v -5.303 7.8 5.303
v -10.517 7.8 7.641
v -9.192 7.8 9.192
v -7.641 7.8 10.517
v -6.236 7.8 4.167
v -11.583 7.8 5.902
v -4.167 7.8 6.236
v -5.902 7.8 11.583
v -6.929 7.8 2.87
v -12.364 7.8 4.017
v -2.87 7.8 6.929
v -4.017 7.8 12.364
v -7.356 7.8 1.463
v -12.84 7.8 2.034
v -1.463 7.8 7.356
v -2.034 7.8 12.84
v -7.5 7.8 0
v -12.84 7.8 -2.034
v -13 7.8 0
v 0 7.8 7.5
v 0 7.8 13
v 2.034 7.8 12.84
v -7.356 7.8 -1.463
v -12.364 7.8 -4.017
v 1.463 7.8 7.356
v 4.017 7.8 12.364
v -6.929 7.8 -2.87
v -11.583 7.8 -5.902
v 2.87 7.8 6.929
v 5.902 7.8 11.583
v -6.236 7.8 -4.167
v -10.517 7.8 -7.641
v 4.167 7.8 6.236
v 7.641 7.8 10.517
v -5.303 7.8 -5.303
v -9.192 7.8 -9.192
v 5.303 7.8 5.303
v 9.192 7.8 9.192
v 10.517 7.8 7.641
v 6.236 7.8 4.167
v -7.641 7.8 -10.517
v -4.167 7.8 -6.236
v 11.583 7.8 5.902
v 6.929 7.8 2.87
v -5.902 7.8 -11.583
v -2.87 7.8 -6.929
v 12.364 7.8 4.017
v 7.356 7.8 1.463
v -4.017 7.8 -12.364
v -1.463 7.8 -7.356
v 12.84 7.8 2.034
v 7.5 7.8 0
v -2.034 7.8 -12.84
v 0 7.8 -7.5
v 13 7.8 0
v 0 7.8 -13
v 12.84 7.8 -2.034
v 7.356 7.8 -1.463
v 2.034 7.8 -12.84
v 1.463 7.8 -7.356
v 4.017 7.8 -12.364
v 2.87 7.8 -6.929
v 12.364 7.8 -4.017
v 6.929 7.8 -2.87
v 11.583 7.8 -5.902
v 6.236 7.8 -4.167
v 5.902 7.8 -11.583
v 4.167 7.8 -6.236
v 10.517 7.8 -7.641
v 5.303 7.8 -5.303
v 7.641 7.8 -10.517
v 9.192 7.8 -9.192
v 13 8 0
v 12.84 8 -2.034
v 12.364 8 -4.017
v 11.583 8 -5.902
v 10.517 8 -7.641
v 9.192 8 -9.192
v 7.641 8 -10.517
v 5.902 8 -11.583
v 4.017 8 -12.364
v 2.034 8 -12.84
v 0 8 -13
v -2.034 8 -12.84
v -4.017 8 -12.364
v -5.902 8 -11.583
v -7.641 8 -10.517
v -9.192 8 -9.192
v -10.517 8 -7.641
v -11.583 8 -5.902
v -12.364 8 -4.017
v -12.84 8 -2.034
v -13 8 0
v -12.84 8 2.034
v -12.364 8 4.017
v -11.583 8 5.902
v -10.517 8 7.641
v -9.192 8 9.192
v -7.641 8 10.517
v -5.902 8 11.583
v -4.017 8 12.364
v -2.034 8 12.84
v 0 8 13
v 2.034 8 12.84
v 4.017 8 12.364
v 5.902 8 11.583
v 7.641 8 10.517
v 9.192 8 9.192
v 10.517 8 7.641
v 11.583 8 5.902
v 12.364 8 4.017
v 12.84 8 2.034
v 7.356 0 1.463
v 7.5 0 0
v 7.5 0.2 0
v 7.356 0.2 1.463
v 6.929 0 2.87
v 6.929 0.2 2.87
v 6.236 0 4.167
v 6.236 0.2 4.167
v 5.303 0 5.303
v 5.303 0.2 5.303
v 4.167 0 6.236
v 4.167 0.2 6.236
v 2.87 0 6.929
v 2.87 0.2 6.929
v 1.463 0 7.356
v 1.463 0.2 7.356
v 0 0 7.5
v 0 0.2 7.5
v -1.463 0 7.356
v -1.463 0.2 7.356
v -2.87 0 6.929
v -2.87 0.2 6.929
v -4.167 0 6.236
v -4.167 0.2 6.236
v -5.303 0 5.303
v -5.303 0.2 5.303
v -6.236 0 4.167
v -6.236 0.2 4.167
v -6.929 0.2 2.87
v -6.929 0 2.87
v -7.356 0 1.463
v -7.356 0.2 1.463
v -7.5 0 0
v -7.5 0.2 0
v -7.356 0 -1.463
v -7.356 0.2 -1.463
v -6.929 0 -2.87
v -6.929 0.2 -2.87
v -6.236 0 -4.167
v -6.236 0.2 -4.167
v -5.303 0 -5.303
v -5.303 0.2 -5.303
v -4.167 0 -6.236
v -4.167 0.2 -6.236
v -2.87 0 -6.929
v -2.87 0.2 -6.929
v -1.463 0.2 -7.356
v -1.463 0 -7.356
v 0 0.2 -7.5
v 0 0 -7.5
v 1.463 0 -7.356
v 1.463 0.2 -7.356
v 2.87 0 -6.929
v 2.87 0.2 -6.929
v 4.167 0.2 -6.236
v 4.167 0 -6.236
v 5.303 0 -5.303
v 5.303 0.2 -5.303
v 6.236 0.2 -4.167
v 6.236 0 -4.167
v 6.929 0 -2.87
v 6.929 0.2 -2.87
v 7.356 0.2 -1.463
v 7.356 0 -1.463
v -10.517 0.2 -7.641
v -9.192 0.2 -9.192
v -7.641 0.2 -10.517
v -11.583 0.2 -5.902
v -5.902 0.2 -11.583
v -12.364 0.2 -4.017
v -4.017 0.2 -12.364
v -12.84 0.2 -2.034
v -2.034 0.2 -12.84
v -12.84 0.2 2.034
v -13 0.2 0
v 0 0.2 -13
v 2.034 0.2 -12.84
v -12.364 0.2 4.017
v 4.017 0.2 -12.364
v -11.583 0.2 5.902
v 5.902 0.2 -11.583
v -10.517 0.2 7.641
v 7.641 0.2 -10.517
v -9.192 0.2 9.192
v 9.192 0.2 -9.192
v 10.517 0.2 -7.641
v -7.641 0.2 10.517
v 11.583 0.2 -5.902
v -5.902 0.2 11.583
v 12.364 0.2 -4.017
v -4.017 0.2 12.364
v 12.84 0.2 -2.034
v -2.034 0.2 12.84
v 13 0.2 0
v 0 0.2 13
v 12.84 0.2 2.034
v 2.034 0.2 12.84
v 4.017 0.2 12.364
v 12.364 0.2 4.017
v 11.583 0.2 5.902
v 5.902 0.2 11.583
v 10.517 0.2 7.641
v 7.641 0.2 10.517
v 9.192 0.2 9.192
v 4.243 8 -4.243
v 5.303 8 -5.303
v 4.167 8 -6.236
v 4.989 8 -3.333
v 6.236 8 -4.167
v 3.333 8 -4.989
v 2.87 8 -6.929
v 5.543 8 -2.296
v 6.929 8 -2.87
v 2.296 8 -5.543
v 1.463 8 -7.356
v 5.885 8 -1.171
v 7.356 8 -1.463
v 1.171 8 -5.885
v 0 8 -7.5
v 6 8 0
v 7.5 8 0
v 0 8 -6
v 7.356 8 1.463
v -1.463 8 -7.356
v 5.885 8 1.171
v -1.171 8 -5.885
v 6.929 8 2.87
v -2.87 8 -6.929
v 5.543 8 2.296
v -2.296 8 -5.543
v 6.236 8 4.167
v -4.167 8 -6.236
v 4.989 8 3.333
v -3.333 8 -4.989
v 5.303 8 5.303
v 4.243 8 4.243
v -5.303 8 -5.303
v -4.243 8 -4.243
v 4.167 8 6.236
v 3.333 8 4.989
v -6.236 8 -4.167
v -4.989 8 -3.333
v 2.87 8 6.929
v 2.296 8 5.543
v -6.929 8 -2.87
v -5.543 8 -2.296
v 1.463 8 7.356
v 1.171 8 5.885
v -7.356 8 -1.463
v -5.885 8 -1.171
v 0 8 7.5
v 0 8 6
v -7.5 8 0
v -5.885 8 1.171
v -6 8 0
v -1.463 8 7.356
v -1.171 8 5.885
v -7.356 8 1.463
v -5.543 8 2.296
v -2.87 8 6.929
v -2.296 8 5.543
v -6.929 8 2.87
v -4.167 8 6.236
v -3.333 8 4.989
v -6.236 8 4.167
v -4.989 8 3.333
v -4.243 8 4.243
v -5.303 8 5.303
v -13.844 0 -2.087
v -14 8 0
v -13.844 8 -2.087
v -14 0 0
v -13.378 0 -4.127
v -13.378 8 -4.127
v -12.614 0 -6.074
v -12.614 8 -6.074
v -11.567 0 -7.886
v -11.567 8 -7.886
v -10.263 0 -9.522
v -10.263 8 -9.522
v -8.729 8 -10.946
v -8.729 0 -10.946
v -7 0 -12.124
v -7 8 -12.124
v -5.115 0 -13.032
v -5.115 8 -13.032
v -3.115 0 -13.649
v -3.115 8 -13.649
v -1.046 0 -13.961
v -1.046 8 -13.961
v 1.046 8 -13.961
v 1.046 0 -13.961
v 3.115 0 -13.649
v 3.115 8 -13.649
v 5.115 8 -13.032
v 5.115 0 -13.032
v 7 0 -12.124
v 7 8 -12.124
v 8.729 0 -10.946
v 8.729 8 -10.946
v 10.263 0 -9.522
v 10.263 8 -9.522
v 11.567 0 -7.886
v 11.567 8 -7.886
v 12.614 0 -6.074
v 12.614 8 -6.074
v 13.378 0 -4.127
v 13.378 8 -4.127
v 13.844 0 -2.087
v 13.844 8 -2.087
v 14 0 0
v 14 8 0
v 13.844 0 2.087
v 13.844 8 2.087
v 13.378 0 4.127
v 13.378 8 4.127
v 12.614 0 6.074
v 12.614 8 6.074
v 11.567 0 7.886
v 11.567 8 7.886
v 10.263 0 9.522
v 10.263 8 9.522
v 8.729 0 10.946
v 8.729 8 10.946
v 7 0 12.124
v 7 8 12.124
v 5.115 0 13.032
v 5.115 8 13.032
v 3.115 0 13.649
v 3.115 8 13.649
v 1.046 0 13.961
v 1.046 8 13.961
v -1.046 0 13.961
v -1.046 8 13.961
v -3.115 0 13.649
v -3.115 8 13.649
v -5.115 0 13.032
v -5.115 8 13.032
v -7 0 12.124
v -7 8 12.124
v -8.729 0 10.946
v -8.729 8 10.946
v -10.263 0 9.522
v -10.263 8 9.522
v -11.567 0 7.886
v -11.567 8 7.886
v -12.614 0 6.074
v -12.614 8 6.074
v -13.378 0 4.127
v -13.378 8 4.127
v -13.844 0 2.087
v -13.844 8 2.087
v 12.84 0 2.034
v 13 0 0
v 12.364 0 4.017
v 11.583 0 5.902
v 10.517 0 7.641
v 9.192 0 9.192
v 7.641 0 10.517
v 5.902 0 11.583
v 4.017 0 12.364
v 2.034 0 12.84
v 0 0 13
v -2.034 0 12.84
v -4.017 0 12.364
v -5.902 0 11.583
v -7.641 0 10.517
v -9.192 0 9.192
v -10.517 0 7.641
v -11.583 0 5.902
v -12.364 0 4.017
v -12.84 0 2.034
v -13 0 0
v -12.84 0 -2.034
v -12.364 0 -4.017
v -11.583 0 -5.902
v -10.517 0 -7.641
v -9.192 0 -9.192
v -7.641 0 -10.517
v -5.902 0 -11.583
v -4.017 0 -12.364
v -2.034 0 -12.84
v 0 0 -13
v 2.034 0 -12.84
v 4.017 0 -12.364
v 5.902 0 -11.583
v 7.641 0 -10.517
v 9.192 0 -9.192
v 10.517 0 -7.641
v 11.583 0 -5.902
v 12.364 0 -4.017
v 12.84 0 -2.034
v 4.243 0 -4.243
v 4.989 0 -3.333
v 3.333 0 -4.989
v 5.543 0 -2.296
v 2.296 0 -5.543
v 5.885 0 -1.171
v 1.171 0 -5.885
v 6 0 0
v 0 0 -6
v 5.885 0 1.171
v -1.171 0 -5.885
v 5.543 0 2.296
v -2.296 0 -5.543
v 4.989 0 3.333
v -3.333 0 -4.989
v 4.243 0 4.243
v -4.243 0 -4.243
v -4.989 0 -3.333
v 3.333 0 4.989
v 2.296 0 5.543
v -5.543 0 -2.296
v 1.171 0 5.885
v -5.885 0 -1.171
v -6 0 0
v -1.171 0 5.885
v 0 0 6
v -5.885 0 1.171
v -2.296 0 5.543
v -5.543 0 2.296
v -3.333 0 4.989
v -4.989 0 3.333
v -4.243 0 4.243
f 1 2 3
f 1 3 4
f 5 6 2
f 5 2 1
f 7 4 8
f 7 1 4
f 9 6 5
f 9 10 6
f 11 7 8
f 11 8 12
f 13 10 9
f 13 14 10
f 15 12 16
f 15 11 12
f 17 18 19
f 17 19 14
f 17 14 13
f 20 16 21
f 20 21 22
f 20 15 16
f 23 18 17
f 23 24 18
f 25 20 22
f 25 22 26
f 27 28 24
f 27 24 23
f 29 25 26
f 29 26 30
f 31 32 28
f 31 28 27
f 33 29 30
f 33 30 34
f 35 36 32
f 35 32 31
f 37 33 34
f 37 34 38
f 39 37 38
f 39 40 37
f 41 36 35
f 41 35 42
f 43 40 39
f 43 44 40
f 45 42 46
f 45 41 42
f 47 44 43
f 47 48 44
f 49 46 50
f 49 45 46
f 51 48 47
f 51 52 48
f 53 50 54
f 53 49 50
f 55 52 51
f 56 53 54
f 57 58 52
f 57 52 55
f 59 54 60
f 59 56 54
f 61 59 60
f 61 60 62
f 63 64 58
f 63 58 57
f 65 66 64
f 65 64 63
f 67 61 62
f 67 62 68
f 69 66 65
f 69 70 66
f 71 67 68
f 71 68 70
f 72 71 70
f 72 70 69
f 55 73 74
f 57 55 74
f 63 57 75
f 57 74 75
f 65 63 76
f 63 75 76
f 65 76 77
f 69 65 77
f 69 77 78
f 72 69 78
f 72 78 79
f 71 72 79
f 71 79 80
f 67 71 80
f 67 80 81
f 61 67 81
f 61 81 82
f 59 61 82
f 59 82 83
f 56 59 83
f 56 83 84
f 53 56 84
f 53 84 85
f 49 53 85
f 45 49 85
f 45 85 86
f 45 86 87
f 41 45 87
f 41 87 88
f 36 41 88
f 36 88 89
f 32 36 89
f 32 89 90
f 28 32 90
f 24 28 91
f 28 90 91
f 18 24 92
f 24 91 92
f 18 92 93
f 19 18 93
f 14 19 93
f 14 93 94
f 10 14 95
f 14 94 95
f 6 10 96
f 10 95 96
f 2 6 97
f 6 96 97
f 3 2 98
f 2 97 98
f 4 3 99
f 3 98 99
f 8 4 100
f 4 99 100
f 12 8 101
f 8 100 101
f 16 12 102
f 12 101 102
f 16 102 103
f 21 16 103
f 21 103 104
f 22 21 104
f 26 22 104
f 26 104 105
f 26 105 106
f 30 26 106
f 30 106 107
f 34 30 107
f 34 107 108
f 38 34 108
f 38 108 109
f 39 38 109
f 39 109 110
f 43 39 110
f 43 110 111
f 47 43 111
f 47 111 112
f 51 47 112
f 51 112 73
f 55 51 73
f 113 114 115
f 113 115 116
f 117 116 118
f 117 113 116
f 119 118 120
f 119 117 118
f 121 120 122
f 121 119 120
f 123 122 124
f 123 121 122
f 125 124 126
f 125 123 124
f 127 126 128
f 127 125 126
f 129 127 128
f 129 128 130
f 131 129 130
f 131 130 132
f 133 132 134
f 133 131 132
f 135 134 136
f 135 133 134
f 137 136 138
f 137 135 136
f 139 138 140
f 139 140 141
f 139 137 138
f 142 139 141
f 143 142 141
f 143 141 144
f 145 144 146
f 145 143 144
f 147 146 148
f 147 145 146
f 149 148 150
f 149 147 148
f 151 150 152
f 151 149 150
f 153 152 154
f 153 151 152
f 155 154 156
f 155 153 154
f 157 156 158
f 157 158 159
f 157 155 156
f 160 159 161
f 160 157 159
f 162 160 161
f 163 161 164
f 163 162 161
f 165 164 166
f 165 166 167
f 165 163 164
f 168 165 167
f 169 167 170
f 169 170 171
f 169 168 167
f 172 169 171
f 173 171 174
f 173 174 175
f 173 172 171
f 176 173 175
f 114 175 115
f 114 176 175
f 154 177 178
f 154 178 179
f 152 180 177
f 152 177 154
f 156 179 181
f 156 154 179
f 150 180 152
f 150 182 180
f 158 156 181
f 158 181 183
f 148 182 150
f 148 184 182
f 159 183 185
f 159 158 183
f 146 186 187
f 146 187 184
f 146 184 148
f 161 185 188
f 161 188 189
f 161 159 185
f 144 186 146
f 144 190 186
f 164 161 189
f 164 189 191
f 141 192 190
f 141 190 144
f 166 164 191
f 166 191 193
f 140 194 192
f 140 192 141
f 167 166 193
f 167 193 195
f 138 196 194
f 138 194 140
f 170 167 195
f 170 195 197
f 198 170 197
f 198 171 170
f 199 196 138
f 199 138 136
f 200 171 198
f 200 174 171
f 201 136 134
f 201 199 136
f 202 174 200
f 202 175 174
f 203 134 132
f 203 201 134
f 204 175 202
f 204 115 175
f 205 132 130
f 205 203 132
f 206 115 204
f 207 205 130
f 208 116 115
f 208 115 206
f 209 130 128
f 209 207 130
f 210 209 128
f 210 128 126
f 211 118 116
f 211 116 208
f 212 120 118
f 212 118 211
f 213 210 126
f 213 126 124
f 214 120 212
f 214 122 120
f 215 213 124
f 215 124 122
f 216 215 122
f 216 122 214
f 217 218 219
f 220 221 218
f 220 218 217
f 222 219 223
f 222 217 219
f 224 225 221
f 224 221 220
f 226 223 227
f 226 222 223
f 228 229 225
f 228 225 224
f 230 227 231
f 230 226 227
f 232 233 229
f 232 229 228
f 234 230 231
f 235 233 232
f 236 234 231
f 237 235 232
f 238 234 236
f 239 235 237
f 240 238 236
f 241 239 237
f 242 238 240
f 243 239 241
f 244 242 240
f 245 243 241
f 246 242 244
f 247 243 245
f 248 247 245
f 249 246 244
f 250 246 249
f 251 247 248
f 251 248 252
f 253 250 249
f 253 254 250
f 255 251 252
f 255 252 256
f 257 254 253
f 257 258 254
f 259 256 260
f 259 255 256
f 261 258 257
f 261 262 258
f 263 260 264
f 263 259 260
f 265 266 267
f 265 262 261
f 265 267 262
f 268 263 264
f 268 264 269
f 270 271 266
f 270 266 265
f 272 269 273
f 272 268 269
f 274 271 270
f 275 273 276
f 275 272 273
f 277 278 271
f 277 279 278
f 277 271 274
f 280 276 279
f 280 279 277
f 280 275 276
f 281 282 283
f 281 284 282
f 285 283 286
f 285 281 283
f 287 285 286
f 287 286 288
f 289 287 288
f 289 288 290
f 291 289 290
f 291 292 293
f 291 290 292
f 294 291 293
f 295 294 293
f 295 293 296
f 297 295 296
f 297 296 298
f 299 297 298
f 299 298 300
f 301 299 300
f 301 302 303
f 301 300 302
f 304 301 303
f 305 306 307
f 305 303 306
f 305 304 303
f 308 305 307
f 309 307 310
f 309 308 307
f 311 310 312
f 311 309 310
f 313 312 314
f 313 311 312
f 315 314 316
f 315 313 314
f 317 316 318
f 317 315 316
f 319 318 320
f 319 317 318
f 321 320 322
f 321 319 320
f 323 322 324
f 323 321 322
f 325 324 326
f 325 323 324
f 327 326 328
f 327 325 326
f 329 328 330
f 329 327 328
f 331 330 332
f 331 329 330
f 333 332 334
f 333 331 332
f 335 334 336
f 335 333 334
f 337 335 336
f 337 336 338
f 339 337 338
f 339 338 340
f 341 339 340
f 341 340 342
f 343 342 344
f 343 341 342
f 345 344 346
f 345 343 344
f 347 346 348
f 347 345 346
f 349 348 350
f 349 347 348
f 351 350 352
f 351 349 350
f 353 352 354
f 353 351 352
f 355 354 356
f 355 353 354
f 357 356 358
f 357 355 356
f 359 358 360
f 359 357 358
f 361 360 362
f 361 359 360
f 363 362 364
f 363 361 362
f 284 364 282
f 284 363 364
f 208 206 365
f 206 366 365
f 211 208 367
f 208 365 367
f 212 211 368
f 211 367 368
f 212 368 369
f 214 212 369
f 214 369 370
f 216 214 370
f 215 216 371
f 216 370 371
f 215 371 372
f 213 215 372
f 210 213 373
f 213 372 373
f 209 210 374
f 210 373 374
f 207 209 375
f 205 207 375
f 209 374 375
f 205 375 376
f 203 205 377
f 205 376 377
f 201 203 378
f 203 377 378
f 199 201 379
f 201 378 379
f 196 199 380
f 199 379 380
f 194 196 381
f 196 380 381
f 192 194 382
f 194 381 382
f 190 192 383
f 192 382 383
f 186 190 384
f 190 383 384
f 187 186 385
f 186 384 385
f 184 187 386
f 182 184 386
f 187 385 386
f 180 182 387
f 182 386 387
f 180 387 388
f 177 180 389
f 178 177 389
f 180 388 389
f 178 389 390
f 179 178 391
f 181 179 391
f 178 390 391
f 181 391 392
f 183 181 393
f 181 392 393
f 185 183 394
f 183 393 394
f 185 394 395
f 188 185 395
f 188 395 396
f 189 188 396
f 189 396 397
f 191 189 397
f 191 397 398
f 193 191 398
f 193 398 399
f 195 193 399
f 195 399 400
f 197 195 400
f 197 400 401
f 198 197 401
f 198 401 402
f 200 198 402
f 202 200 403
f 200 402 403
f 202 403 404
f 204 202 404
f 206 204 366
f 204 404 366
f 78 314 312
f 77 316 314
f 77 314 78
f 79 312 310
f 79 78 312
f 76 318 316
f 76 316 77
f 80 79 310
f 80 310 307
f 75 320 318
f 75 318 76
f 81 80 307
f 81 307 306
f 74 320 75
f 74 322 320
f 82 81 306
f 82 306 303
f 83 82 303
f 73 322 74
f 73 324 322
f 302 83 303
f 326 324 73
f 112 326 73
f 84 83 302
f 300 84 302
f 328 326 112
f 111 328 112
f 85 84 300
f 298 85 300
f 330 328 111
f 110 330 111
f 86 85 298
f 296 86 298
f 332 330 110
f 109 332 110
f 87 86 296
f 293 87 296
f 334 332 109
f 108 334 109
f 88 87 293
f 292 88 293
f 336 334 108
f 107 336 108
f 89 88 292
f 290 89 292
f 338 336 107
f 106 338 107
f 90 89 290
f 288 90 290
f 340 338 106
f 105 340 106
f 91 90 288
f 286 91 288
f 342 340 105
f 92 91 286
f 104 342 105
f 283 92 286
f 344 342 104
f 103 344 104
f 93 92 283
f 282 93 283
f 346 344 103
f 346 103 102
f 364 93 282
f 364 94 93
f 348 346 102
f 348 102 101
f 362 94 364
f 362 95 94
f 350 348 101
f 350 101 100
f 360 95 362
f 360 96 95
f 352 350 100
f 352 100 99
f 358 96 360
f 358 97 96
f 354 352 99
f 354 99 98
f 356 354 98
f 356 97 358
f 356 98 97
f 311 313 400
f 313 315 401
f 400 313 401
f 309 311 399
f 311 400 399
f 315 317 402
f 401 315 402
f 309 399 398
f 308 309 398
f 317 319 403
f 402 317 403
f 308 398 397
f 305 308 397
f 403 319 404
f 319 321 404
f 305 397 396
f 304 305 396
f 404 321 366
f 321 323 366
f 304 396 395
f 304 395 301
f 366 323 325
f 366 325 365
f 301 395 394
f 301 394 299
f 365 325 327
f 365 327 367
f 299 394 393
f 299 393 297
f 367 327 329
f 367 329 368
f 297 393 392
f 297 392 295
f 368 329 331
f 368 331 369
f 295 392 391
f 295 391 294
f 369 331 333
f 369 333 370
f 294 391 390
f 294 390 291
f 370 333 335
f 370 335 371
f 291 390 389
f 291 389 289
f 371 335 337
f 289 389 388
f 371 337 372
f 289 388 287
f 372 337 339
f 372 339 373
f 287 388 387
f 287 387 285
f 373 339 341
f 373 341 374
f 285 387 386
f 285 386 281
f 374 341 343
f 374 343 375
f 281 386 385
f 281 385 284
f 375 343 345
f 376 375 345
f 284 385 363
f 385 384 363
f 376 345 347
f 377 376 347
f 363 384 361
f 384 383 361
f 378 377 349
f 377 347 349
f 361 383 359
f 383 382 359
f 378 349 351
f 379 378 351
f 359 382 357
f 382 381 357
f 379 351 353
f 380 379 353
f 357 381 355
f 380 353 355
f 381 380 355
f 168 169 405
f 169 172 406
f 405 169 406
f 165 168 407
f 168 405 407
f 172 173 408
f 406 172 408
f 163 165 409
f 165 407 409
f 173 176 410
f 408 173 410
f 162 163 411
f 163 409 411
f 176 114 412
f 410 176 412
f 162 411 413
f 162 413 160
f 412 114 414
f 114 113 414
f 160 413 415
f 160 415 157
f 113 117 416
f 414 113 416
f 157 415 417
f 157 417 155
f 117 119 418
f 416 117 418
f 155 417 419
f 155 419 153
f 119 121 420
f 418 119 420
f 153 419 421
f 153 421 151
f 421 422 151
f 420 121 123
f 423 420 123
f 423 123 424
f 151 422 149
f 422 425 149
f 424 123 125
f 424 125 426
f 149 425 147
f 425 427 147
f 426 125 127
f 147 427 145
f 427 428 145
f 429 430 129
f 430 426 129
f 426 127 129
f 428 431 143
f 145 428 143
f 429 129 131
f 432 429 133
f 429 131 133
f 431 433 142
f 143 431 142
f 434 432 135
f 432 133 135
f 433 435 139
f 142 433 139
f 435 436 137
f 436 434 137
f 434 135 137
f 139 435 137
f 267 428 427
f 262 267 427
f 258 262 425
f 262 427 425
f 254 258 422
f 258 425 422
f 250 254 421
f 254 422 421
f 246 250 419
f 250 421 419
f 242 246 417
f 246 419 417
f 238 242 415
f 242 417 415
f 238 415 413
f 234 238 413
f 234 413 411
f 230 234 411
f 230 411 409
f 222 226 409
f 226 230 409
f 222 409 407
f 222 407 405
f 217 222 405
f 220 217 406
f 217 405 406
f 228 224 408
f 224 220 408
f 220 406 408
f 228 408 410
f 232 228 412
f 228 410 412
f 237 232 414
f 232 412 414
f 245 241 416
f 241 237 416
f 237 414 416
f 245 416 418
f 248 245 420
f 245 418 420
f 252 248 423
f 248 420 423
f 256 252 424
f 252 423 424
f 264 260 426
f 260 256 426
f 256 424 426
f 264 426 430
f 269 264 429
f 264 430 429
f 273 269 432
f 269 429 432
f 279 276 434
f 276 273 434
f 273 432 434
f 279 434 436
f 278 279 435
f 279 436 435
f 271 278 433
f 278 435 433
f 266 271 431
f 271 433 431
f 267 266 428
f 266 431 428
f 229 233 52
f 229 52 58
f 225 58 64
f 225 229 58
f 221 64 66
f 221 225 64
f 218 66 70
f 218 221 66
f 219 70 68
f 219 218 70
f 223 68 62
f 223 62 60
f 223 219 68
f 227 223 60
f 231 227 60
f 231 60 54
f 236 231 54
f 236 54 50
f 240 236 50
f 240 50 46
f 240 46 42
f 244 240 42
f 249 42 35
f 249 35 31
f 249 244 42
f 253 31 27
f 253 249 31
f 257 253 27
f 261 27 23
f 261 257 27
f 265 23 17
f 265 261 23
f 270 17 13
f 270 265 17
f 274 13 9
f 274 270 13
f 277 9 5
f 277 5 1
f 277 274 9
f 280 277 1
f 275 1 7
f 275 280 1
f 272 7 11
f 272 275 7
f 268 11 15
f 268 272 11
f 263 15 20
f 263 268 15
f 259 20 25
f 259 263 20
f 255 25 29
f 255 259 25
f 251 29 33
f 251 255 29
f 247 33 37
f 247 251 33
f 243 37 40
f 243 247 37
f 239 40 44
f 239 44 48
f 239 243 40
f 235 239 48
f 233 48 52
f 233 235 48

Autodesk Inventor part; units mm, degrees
ref_plane "YZ Plane" through (0, 0, 0) normal (1, 0, 0) x (0, 1, 0)
ref_plane "XZ Plane" through (0, 0, 0) normal (0, 1, 0) x (-1, 0, 0)
ref_plane "XY Plane" through (0, 0, 0) normal (0, 0, 1) x (1, 0, 0)
sketch "スケッチ1" plane through (0, 0, 0) normal (0, 1, 0) x (-1, 0, 0)
  circle A0 centre (0, 0) radius 6
  circle A1 centre (0, 0) radius 14
  dimension "d0" = 12
  dimension "d1" = 28
extrude "押し出し1" add sketch "スケッチ1" along normal blind 8
sketch "スケッチ2" plane through (0, 0, 0) normal (0, -1, 0) x (1, 0, 0)
  circle A0 centre (0, 0) radius 7.5
  circle A1 centre (0, 0) radius 13
  dimension "d4" = 15
  dimension "d5" = 26
extrude "押し出し2" cut sketch "スケッチ2" against normal blind 0.2
sketch "スケッチ3" plane through (0, 8, 0) normal (0, 1, 0) x (1, 0, 0)
  circle A0 centre (0, 0) radius 7.5
  circle A1 centre (0, 0) radius 13
  dimension "d8" = 15
  dimension "d9" = 26
extrude "押し出し3" cut sketch "スケッチ3" against normal blind 0.2
properties part number "Bearing_6001Z" material "ステンレス鋼"
